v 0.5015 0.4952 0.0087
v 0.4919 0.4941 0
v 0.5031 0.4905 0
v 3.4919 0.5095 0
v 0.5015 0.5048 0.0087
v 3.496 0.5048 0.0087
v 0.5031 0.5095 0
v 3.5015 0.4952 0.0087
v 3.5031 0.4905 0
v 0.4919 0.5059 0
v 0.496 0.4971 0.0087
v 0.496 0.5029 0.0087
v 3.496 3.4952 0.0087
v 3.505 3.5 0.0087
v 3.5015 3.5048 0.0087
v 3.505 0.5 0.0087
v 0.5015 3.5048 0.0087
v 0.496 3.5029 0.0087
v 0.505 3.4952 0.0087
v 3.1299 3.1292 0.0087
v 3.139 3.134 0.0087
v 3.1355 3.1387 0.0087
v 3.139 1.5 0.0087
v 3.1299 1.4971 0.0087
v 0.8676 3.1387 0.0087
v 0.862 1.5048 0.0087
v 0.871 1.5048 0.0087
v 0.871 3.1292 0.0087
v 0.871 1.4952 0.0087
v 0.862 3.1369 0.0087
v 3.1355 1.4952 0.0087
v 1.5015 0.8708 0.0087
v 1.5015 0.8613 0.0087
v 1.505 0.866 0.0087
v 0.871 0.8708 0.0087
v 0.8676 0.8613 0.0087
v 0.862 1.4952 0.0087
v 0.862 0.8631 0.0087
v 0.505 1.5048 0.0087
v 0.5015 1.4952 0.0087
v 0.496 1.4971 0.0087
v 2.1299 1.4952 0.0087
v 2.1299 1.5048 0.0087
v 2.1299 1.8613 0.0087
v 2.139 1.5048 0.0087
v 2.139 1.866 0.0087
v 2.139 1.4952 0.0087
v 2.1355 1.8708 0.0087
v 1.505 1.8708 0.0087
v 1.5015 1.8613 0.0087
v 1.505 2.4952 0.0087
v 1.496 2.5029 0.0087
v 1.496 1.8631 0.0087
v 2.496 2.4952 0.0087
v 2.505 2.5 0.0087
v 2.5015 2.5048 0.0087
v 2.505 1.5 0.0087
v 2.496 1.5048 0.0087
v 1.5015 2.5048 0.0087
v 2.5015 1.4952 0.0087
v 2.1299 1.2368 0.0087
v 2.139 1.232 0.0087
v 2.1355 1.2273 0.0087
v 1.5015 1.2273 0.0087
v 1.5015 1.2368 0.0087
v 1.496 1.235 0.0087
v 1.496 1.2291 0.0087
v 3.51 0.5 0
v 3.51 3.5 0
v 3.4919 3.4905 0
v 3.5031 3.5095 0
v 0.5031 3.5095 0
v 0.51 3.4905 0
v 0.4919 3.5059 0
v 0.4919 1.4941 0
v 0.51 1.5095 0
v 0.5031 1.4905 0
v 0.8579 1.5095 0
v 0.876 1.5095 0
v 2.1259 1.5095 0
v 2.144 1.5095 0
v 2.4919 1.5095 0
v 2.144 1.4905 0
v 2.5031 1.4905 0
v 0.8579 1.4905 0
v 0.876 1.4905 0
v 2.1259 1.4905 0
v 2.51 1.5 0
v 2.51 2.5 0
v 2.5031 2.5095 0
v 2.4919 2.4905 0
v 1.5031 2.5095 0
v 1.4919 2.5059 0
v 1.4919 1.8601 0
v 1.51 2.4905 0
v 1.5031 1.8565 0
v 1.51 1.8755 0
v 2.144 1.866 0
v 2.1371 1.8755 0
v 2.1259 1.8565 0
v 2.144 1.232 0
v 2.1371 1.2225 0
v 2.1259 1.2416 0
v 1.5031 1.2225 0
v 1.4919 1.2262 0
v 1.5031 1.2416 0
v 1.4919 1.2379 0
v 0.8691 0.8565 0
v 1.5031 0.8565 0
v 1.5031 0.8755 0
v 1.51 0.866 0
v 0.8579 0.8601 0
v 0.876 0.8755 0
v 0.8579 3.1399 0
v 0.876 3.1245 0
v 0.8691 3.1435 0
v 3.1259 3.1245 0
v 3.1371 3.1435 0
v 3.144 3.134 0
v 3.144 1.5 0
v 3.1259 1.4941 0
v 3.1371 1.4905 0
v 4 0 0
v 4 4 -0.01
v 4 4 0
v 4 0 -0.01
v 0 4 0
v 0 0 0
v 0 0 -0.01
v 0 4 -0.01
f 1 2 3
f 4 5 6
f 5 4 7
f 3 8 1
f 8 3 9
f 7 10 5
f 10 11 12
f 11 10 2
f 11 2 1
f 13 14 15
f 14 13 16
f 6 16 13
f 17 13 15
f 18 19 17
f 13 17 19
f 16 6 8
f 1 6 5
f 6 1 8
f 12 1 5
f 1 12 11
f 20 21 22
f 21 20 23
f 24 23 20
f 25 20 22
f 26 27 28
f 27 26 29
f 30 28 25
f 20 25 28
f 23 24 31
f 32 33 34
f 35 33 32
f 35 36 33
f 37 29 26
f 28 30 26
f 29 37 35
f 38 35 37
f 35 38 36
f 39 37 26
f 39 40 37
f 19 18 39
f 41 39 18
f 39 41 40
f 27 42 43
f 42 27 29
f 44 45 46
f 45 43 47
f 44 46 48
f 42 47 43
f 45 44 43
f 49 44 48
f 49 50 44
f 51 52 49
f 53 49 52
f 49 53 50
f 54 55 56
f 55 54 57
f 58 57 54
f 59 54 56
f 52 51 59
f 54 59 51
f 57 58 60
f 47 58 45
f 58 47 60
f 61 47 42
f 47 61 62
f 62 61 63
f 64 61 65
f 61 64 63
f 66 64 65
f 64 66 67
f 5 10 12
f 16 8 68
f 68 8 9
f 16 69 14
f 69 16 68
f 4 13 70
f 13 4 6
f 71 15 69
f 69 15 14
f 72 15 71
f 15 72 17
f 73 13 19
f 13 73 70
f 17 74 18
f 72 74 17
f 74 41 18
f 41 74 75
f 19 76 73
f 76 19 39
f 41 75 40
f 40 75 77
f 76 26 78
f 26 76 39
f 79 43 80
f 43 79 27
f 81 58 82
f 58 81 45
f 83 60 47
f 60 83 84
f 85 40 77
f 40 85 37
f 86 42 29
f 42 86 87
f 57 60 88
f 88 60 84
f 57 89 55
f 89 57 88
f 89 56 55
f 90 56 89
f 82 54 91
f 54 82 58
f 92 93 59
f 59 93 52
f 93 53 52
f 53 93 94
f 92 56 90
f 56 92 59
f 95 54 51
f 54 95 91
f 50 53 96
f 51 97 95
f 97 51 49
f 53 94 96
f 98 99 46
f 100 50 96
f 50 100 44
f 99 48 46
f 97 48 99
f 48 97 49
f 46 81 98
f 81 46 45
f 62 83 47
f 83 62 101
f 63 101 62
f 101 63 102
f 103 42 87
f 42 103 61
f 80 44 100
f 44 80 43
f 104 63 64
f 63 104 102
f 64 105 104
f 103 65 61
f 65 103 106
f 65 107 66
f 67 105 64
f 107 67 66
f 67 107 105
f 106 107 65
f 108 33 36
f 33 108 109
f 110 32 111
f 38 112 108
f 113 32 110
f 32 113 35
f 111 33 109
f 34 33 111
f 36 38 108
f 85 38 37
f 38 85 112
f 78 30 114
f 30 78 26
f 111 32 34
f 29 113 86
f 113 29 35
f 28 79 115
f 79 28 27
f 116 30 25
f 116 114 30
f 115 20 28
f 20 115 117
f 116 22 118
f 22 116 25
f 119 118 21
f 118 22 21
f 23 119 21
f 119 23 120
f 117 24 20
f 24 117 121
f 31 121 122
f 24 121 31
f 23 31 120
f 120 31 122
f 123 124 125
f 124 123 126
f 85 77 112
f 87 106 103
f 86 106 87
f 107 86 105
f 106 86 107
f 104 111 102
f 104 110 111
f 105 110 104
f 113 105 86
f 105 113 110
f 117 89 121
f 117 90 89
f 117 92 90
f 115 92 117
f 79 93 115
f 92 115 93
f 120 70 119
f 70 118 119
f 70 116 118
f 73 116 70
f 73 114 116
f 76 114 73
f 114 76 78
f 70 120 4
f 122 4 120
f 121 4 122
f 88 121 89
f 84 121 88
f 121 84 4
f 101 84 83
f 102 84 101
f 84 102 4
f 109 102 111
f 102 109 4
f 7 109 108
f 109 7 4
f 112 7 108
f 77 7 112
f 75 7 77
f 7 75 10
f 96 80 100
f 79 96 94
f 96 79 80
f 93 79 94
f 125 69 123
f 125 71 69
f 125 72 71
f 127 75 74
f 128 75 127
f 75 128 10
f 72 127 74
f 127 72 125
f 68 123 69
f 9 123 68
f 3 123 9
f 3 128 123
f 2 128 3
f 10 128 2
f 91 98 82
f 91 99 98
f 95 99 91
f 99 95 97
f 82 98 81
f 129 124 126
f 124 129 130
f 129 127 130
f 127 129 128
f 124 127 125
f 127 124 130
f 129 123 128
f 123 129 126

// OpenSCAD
hull(){
    translate([0.5, 0.5]) sphere(0.01);
    translate([1.5, 0.5]) sphere(0.01);
}
hull(){
    translate([1.5, 0.5]) sphere(0.01);
    translate([2.5, 0.5]) sphere(0.01);
}
hull(){
    translate([2.5, 0.5]) sphere(0.01);
    translate([3.5, 0.5]) sphere(0.01);
}
hull(){
    translate([3.5, 0.5]) sphere(0.01);
    translate([3.5, 1.5]) sphere(0.01);
}
hull(){
    translate([3.5, 1.5]) sphere(0.01);
    translate([3.5, 2.5]) sphere(0.01);
}
hull(){
    translate([3.5, 2.5]) sphere(0.01);
    translate([3.5, 3.5]) sphere(0.01);
}
hull(){
    translate([3.5, 3.5]) sphere(0.01);
    translate([2.5, 3.5]) sphere(0.01);
}
hull(){
    translate([2.5, 3.5]) sphere(0.01);
    translate([1.5, 3.5]) sphere(0.01);
}
hull(){
    translate([1.5, 3.5]) sphere(0.01);
    translate([0.5, 3.5]) sphere(0.01);
}
hull(){
    translate([0.5, 3.5]) sphere(0.01);
    translate([0.5, 2.5]) sphere(0.01);
}
hull(){
    translate([0.5, 2.5]) sphere(0.01);
    translate([0.5, 1.5]) sphere(0.01);
}
hull(){
    translate([0.5, 1.5]) sphere(0.01);
    translate([1.5, 1.5]) sphere(0.01);
}
hull(){
    translate([1.5, 1.5]) sphere(0.01);
    translate([2.5, 1.5]) sphere(0.01);
}
hull(){
    translate([2.5, 1.5]) sphere(0.01);
    translate([2.5, 2.5]) sphere(0.01);
}
hull(){
    translate([2.5, 2.5]) sphere(0.01);
    translate([1.5, 2.5]) sphere(0.01);
}
hull(){
    translate([1.5, 2.5]) sphere(0.01);
    translate([1.5, 1.8660254037844386]) sphere(0.01);
}
hull(){
    translate([1.5, 1.8660254037844386]) sphere(0.01);
    translate([2.133974596215561, 1.8660254037844386]) sphere(0.01);
}
hull(){
    translate([2.133974596215561, 1.8660254037844386]) sphere(0.01);
    translate([2.133974596215561, 1.2320508103688537]) sphere(0.01);
}
hull(){
    translate([2.133974596215561, 1.2320508103688537]) sphere(0.01);
    translate([1.5, 1.2320508103688537]) sphere(0.01);
}
hull(){
    translate([1.5, 0.8660254037844386]) sphere(0.01);
    translate([0.8660254037844386, 0.8660254037844386]) sphere(0.01);
}
hull(){
    translate([0.8660254037844386, 0.8660254037844386]) sphere(0.01);
    translate([0.8660254037844386, 1.5]) sphere(0.01);
}
hull(){
    translate([0.8660254037844386, 1.5]) sphere(0.01);
    translate([0.8660254037844386, 2.5]) sphere(0.01);
}
hull(){
    translate([0.8660254037844386, 2.5]) sphere(0.01);
    translate([0.8660254037844386, 3.133974596215561]) sphere(0.01);
}
hull(){
    translate([0.8660254037844386, 3.133974596215561]) sphere(0.01);
    translate([1.5, 3.133974596215561]) sphere(0.01);
}
hull(){
    translate([1.5, 3.133974596215561]) sphere(0.01);
    translate([2.5, 3.133974596215561]) sphere(0.01);
}
hull(){
    translate([2.5, 3.133974596215561]) sphere(0.01);
    translate([3.133974596215561, 3.133974596215561]) sphere(0.01);
}
hull(){
    translate([3.133974596215561, 3.133974596215561]) sphere(0.01);
    translate([3.133974596215561, 2.5]) sphere(0.01);
}
hull(){
    translate([3.133974596215561, 2.5]) sphere(0.01);
    translate([3.133974596215561, 1.5]) sphere(0.01);
}
translate([0,0,-0.01]) color([0.1,0.1,0.1]) cube([4,4,0.01]);
